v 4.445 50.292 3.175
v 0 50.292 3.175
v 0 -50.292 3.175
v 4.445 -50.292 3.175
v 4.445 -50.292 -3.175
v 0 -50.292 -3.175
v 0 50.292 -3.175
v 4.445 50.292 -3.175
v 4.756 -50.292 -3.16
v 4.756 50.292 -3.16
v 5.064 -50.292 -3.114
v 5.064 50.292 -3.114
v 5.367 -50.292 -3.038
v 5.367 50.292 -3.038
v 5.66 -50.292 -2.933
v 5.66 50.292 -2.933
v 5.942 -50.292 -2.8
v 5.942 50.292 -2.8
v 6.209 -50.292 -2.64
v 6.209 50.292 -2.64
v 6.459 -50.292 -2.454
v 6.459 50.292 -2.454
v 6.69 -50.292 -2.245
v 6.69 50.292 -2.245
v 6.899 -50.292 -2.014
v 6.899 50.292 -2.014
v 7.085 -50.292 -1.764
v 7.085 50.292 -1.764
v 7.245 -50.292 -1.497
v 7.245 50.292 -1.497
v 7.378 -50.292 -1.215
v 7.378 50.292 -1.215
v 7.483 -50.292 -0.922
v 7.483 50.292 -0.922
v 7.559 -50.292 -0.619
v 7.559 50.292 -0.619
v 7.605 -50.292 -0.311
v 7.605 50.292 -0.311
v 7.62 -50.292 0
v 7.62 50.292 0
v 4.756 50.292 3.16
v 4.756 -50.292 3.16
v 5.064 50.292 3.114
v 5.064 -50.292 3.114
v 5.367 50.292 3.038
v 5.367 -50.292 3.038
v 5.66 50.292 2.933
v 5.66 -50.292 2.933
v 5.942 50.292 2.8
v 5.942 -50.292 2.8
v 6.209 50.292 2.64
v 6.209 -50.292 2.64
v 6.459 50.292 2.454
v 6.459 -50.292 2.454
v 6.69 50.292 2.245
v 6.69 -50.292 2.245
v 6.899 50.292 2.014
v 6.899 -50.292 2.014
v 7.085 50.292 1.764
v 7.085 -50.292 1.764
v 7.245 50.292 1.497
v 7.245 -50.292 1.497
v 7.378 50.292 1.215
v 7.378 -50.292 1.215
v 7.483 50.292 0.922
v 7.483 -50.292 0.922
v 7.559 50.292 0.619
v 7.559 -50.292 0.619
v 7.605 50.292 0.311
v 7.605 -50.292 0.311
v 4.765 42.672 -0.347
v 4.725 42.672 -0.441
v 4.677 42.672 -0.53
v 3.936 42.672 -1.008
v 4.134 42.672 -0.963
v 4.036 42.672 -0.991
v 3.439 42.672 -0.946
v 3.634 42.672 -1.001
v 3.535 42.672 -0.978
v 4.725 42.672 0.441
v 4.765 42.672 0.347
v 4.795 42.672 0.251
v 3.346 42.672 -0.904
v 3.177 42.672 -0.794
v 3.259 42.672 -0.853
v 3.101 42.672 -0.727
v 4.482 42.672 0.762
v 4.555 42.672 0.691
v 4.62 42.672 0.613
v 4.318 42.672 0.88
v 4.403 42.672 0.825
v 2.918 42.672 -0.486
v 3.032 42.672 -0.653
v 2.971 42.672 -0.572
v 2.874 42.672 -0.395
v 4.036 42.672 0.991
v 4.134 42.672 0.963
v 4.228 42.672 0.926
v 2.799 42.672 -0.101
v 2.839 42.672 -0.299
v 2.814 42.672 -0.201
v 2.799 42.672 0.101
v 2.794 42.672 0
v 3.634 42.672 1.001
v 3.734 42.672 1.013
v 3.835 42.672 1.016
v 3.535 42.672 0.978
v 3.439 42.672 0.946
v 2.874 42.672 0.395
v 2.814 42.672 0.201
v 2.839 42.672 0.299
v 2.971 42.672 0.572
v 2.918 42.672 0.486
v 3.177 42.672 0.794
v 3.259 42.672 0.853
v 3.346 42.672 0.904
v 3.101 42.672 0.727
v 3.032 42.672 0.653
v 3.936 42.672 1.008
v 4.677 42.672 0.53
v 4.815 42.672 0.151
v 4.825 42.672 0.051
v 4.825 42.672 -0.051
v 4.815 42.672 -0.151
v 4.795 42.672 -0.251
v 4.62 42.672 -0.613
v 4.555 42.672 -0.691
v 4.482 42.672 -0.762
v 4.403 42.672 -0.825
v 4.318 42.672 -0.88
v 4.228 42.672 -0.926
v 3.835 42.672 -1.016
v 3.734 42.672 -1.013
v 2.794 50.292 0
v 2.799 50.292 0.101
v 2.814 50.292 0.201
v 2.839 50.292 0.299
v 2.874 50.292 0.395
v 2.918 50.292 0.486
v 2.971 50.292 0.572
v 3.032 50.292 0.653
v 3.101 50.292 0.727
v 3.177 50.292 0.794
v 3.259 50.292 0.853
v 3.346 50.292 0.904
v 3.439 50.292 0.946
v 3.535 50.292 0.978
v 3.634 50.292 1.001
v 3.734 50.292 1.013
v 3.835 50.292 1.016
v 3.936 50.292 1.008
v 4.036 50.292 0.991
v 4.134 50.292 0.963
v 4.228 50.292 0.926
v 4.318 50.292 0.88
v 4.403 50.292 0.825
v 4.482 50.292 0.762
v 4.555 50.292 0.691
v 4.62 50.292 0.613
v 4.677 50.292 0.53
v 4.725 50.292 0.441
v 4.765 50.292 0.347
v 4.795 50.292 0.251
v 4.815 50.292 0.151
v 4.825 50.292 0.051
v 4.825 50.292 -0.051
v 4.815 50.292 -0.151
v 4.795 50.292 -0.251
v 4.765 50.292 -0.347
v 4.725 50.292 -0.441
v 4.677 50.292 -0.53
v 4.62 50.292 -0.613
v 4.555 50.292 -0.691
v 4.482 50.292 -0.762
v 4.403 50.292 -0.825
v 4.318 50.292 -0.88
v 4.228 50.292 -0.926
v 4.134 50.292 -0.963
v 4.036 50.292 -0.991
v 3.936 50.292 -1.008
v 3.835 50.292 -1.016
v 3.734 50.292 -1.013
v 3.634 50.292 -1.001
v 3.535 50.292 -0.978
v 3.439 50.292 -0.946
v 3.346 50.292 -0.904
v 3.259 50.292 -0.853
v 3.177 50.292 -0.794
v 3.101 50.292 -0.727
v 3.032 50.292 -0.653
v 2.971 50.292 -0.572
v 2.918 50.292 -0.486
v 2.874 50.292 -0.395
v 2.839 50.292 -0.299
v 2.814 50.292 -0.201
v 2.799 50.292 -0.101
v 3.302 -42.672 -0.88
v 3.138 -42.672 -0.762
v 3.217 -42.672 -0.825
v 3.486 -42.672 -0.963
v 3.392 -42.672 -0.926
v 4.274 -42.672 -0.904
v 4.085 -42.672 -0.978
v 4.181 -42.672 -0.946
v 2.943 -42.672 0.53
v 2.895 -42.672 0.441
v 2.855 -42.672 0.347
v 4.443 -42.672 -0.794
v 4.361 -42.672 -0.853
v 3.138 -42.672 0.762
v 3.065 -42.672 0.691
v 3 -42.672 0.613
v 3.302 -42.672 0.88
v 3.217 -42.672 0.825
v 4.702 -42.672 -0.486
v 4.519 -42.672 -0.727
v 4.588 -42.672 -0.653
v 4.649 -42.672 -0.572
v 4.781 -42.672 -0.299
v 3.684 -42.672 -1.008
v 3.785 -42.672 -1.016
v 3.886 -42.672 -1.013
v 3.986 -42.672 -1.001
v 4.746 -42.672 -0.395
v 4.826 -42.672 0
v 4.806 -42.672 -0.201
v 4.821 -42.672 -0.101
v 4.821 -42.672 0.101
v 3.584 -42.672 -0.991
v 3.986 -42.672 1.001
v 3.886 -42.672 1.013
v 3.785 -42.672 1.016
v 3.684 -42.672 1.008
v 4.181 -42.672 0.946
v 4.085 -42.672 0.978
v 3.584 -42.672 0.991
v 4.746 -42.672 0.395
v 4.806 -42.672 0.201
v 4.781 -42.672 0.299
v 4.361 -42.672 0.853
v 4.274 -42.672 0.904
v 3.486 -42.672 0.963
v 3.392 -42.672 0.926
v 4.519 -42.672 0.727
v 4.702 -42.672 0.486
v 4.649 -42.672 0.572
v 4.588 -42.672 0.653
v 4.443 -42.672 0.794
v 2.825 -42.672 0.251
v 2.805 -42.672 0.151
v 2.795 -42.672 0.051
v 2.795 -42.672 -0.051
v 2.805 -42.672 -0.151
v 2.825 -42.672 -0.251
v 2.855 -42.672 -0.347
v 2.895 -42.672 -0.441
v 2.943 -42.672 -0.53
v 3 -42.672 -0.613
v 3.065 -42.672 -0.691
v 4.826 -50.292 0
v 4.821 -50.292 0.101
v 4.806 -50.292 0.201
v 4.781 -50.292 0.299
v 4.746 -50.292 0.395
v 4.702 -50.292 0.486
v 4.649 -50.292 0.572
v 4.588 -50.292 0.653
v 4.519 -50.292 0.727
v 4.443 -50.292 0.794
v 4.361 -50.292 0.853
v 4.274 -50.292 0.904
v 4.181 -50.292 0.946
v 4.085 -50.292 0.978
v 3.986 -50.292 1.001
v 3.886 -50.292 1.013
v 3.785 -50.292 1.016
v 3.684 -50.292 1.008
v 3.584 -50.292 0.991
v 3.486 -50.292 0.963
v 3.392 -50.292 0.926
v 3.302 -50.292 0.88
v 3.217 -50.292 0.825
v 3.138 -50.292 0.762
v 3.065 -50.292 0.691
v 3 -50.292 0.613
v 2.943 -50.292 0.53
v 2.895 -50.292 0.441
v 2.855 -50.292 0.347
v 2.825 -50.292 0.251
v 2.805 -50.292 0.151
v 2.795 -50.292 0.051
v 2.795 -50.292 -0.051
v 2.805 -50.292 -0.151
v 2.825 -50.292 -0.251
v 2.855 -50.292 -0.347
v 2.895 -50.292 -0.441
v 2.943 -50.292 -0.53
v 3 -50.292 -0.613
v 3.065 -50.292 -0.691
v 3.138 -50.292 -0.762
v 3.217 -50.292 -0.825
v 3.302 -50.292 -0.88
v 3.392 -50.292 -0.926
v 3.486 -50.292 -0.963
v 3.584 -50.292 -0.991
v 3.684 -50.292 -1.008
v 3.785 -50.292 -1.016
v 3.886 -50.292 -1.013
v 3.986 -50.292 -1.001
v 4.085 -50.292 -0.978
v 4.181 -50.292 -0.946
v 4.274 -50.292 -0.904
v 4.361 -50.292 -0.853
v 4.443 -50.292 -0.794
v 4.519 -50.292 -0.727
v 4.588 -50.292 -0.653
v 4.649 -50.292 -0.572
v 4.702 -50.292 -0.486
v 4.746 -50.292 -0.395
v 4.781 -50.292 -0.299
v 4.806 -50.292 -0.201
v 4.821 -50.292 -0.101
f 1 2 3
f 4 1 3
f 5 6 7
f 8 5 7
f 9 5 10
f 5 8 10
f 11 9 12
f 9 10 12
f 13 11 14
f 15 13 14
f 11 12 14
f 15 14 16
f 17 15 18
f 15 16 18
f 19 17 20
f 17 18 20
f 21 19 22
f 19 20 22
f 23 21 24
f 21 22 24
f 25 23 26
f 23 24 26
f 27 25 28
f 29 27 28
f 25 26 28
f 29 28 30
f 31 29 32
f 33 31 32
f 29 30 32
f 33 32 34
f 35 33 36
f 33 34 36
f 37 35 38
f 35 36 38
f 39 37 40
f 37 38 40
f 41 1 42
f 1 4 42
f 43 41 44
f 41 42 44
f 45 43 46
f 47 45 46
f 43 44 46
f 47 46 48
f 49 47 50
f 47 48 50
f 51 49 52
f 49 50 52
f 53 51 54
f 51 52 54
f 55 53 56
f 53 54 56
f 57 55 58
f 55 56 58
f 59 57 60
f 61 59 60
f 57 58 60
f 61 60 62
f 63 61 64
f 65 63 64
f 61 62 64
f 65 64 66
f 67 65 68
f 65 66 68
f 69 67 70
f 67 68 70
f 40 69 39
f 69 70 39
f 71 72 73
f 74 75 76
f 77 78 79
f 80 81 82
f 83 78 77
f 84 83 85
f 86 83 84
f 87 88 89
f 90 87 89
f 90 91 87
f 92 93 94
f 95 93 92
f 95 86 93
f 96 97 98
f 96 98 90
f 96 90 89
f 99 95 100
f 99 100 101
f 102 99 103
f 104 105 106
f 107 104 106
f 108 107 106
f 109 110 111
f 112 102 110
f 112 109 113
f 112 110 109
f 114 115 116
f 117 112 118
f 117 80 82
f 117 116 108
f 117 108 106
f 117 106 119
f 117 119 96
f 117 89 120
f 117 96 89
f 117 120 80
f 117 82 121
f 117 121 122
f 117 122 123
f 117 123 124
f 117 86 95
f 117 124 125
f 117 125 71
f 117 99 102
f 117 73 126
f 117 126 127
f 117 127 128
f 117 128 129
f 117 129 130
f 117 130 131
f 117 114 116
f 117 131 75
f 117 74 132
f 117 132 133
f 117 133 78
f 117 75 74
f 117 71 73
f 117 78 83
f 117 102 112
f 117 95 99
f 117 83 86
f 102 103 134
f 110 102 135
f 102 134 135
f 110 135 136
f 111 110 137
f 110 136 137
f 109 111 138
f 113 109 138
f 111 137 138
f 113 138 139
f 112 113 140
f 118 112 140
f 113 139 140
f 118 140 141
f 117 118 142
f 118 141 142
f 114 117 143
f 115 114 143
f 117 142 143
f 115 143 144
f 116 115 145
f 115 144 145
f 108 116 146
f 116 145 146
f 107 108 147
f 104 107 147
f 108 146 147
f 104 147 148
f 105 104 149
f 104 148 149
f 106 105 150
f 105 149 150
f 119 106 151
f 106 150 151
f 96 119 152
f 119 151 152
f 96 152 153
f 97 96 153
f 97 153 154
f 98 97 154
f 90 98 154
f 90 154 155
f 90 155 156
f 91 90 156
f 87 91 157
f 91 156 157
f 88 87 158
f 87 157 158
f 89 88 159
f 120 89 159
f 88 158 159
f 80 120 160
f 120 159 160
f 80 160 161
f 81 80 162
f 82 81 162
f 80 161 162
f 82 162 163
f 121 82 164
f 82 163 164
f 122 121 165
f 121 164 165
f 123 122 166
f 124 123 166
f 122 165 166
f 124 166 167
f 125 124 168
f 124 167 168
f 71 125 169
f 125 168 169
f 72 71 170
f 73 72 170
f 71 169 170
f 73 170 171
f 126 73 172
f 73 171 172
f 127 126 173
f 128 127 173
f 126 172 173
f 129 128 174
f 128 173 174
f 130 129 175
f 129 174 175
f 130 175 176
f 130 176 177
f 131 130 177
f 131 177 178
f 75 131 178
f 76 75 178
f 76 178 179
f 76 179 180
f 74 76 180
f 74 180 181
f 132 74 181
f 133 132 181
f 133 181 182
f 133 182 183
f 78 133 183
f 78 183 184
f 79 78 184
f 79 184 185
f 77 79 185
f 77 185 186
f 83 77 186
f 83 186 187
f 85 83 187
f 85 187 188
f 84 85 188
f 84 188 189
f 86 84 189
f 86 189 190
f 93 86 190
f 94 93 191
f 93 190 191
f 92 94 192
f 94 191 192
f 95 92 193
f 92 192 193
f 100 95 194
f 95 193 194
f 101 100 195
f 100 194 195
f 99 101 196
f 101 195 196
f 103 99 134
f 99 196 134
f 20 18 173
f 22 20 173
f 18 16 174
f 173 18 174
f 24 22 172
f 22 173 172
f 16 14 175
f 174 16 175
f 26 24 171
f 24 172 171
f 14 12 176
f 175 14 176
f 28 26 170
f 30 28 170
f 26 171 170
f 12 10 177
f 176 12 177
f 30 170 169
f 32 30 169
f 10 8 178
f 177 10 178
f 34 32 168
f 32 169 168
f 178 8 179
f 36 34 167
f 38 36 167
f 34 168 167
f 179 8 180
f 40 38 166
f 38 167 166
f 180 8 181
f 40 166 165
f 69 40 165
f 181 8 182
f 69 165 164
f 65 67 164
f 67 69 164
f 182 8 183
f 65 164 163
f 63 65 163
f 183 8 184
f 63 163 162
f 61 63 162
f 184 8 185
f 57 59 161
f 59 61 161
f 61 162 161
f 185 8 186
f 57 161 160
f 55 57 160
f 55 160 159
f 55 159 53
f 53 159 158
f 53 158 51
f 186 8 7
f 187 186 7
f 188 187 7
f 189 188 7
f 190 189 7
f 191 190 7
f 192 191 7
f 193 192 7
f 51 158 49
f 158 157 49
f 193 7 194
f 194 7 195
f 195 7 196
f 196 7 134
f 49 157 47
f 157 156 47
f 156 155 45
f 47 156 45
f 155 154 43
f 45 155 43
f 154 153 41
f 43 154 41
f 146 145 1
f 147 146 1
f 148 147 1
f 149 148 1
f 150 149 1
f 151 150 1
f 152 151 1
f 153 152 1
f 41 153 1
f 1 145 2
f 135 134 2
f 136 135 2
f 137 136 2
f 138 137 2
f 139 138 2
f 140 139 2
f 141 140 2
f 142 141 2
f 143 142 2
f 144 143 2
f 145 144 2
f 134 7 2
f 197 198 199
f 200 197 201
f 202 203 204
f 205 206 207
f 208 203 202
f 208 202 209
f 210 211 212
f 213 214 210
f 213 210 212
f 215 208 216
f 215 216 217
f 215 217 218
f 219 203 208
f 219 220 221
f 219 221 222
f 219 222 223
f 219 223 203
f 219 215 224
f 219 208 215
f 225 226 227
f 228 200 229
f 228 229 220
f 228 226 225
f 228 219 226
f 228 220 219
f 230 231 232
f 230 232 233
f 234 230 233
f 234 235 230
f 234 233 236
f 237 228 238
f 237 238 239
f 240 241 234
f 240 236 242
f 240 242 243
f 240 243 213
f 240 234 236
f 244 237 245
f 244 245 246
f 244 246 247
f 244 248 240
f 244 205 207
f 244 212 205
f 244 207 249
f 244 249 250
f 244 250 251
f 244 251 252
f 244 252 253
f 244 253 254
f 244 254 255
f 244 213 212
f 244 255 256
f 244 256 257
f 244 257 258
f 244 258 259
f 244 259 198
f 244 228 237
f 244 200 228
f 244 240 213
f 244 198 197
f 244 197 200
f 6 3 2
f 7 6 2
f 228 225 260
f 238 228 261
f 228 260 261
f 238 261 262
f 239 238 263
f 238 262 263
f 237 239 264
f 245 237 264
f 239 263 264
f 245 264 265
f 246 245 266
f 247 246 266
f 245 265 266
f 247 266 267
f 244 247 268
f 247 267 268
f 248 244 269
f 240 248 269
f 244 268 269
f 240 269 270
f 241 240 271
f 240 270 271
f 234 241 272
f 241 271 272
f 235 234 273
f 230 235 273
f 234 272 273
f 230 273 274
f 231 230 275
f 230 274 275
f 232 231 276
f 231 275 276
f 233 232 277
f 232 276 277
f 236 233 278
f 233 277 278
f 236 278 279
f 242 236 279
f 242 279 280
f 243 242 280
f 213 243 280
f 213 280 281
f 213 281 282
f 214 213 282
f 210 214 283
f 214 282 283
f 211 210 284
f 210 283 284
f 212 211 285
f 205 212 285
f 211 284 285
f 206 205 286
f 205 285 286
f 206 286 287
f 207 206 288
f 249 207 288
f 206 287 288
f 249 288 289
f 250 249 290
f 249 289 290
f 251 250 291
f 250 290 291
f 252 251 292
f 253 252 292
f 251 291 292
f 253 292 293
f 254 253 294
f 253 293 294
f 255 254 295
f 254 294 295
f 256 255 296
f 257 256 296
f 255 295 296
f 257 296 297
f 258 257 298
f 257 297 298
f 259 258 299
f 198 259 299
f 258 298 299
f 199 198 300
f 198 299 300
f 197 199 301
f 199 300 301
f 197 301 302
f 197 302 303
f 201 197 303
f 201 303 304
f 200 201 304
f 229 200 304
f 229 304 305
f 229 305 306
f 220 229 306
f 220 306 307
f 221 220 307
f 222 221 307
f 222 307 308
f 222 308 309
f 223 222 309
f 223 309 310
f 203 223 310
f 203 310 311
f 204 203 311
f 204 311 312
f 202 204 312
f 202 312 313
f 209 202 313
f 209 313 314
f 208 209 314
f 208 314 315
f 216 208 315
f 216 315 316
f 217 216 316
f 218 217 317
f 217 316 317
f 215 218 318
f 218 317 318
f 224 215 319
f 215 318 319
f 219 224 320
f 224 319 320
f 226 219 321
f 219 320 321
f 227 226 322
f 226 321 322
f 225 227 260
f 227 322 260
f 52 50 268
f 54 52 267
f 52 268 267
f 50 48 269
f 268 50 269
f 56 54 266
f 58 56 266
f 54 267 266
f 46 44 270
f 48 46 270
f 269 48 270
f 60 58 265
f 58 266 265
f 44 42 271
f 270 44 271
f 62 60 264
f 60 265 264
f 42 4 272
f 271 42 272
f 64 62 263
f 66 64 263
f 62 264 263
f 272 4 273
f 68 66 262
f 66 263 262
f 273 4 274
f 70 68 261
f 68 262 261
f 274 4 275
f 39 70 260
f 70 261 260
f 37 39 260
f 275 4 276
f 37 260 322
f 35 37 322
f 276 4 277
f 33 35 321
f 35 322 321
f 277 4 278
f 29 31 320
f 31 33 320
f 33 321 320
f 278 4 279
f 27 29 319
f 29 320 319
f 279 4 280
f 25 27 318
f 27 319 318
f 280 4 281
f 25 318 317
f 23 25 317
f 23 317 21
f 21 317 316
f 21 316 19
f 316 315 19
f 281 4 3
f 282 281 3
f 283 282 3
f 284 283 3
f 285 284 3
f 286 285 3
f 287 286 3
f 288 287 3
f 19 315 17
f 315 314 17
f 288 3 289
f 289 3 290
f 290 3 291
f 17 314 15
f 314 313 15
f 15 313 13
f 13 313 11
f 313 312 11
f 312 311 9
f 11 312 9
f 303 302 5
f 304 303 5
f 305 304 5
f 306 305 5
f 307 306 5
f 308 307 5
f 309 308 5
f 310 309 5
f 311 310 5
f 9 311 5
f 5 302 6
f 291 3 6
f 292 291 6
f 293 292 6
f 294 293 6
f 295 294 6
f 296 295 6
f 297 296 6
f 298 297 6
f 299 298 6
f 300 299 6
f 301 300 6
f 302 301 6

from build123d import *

# Parameters (mm, degrees)
F1_DEPTH = 7.62
F2_R     = 3.17499
F4_R     = 1.016
F5_DEPTH = 7.62
F3_R     = 1.016
F6_DEPTH = 7.62


# Not quite as in the source:
# - a fillet or chamfer is up to 0.001 mm smaller than in the source, because OpenCascade refuses the exact size


with BuildPart() as f1:
    # F0 (on Right) → F1 (new body)
    with BuildSketch(Plane.YZ):
        Polygon((50.292, -3.175), (50.292, 3.175), (0, 3.175), (-50.292, 3.175), (-50.292, -3.175), align=None)
    extrude(amount=F1_DEPTH)

    # F2 (radius 3.175 in the source; OpenCascade refuses exactly that, so slightly less here)
    f2_edges = [f1.edges().sort_by_distance(p)[0] for p in [
        (7.62, 0, -3.175),
        (7.62, 0, 3.175),
    ]]
    fillet(f2_edges, radius=F2_R)

    # F4 (on face) → F5 (cut)
    with BuildSketch(Plane.XZ.offset(50.292)):
        with Locations((3.81, 0)):
            Circle(F4_R)
    extrude(amount=-F5_DEPTH, mode=Mode.SUBTRACT)

    # F3 (on face) → F6 (cut)
    with BuildSketch(Plane(origin=(0, 50.292, 0), x_dir=(-1, 0, 0), z_dir=(0, 1, 0))):
        with Locations((-3.81, 0)):
            Circle(F3_R)
    extrude(amount=-F6_DEPTH, mode=Mode.SUBTRACT)


solid = f1.part
